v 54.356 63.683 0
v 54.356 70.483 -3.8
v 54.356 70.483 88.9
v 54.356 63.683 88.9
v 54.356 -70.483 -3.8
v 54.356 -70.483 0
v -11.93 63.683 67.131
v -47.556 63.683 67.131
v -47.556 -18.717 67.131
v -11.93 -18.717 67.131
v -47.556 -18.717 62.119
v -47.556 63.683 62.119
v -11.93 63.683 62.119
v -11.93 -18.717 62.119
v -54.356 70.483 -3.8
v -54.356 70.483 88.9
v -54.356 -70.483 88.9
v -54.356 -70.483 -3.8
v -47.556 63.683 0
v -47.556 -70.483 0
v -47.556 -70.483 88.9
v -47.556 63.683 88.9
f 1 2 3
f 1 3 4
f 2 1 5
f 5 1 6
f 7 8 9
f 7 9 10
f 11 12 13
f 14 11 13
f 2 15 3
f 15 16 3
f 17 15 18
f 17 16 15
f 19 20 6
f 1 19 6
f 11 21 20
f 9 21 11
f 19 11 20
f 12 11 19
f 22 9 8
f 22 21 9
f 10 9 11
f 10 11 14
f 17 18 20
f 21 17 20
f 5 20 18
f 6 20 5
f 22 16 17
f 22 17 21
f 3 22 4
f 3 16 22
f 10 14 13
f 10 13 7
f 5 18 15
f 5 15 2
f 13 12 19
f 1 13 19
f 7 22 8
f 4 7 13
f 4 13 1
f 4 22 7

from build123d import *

# Parameters (mm, degrees)
F0_W     = 108.7121069431
F0_H     = 140.9654691815
F0_W_2   = 95.1121076941
F0_H_2   = 127.3654699326
F1_DEPTH = 88.9
F2_W     = 108.7121069431
F2_H     = 140.9654691815
F3_DEPTH = 3.8
F4_W     = 101.9121073186
F4_H     = 134.165469557
F5_DEPTH = 88.9
F6_W     = 35.625605844
F6_H     = 5.0125271082
F7_DEPTH = 82.4


with BuildPart() as f1:
    # F0 (on Top) → F1 (new body)
    with BuildSketch(Plane.XY):
        Rectangle(F0_W, F0_H)
        Rectangle(F0_W_2, F0_H_2, mode=Mode.SUBTRACT)
    extrude(amount=F1_DEPTH)

    # F2 (on face) → F3 (join)
    with BuildSketch(Plane(origin=(0, 0, 0), x_dir=(1, 0, 0), z_dir=(0, 0, -1))):
        Rectangle(F2_W, F2_H)
    extrude(amount=F3_DEPTH)

    # F4 (on face) → F5 (cut, through all)
    with BuildSketch(Plane.XY.offset(88.9)):
        with Locations((3.3999998122, -3.3999998122)):
            Rectangle(F4_W, F4_H)
    extrude(amount=-F5_DEPTH, mode=Mode.SUBTRACT)

    # F6 (on face) → F7 (join)
    with BuildSketch(Plane.XZ.offset(-63.6827349663)):
        with Locations((-29.7432509251, 64.6251067519)):
            Rectangle(F6_W, F6_H)
    extrude(amount=F7_DEPTH)


solid = f1.part
